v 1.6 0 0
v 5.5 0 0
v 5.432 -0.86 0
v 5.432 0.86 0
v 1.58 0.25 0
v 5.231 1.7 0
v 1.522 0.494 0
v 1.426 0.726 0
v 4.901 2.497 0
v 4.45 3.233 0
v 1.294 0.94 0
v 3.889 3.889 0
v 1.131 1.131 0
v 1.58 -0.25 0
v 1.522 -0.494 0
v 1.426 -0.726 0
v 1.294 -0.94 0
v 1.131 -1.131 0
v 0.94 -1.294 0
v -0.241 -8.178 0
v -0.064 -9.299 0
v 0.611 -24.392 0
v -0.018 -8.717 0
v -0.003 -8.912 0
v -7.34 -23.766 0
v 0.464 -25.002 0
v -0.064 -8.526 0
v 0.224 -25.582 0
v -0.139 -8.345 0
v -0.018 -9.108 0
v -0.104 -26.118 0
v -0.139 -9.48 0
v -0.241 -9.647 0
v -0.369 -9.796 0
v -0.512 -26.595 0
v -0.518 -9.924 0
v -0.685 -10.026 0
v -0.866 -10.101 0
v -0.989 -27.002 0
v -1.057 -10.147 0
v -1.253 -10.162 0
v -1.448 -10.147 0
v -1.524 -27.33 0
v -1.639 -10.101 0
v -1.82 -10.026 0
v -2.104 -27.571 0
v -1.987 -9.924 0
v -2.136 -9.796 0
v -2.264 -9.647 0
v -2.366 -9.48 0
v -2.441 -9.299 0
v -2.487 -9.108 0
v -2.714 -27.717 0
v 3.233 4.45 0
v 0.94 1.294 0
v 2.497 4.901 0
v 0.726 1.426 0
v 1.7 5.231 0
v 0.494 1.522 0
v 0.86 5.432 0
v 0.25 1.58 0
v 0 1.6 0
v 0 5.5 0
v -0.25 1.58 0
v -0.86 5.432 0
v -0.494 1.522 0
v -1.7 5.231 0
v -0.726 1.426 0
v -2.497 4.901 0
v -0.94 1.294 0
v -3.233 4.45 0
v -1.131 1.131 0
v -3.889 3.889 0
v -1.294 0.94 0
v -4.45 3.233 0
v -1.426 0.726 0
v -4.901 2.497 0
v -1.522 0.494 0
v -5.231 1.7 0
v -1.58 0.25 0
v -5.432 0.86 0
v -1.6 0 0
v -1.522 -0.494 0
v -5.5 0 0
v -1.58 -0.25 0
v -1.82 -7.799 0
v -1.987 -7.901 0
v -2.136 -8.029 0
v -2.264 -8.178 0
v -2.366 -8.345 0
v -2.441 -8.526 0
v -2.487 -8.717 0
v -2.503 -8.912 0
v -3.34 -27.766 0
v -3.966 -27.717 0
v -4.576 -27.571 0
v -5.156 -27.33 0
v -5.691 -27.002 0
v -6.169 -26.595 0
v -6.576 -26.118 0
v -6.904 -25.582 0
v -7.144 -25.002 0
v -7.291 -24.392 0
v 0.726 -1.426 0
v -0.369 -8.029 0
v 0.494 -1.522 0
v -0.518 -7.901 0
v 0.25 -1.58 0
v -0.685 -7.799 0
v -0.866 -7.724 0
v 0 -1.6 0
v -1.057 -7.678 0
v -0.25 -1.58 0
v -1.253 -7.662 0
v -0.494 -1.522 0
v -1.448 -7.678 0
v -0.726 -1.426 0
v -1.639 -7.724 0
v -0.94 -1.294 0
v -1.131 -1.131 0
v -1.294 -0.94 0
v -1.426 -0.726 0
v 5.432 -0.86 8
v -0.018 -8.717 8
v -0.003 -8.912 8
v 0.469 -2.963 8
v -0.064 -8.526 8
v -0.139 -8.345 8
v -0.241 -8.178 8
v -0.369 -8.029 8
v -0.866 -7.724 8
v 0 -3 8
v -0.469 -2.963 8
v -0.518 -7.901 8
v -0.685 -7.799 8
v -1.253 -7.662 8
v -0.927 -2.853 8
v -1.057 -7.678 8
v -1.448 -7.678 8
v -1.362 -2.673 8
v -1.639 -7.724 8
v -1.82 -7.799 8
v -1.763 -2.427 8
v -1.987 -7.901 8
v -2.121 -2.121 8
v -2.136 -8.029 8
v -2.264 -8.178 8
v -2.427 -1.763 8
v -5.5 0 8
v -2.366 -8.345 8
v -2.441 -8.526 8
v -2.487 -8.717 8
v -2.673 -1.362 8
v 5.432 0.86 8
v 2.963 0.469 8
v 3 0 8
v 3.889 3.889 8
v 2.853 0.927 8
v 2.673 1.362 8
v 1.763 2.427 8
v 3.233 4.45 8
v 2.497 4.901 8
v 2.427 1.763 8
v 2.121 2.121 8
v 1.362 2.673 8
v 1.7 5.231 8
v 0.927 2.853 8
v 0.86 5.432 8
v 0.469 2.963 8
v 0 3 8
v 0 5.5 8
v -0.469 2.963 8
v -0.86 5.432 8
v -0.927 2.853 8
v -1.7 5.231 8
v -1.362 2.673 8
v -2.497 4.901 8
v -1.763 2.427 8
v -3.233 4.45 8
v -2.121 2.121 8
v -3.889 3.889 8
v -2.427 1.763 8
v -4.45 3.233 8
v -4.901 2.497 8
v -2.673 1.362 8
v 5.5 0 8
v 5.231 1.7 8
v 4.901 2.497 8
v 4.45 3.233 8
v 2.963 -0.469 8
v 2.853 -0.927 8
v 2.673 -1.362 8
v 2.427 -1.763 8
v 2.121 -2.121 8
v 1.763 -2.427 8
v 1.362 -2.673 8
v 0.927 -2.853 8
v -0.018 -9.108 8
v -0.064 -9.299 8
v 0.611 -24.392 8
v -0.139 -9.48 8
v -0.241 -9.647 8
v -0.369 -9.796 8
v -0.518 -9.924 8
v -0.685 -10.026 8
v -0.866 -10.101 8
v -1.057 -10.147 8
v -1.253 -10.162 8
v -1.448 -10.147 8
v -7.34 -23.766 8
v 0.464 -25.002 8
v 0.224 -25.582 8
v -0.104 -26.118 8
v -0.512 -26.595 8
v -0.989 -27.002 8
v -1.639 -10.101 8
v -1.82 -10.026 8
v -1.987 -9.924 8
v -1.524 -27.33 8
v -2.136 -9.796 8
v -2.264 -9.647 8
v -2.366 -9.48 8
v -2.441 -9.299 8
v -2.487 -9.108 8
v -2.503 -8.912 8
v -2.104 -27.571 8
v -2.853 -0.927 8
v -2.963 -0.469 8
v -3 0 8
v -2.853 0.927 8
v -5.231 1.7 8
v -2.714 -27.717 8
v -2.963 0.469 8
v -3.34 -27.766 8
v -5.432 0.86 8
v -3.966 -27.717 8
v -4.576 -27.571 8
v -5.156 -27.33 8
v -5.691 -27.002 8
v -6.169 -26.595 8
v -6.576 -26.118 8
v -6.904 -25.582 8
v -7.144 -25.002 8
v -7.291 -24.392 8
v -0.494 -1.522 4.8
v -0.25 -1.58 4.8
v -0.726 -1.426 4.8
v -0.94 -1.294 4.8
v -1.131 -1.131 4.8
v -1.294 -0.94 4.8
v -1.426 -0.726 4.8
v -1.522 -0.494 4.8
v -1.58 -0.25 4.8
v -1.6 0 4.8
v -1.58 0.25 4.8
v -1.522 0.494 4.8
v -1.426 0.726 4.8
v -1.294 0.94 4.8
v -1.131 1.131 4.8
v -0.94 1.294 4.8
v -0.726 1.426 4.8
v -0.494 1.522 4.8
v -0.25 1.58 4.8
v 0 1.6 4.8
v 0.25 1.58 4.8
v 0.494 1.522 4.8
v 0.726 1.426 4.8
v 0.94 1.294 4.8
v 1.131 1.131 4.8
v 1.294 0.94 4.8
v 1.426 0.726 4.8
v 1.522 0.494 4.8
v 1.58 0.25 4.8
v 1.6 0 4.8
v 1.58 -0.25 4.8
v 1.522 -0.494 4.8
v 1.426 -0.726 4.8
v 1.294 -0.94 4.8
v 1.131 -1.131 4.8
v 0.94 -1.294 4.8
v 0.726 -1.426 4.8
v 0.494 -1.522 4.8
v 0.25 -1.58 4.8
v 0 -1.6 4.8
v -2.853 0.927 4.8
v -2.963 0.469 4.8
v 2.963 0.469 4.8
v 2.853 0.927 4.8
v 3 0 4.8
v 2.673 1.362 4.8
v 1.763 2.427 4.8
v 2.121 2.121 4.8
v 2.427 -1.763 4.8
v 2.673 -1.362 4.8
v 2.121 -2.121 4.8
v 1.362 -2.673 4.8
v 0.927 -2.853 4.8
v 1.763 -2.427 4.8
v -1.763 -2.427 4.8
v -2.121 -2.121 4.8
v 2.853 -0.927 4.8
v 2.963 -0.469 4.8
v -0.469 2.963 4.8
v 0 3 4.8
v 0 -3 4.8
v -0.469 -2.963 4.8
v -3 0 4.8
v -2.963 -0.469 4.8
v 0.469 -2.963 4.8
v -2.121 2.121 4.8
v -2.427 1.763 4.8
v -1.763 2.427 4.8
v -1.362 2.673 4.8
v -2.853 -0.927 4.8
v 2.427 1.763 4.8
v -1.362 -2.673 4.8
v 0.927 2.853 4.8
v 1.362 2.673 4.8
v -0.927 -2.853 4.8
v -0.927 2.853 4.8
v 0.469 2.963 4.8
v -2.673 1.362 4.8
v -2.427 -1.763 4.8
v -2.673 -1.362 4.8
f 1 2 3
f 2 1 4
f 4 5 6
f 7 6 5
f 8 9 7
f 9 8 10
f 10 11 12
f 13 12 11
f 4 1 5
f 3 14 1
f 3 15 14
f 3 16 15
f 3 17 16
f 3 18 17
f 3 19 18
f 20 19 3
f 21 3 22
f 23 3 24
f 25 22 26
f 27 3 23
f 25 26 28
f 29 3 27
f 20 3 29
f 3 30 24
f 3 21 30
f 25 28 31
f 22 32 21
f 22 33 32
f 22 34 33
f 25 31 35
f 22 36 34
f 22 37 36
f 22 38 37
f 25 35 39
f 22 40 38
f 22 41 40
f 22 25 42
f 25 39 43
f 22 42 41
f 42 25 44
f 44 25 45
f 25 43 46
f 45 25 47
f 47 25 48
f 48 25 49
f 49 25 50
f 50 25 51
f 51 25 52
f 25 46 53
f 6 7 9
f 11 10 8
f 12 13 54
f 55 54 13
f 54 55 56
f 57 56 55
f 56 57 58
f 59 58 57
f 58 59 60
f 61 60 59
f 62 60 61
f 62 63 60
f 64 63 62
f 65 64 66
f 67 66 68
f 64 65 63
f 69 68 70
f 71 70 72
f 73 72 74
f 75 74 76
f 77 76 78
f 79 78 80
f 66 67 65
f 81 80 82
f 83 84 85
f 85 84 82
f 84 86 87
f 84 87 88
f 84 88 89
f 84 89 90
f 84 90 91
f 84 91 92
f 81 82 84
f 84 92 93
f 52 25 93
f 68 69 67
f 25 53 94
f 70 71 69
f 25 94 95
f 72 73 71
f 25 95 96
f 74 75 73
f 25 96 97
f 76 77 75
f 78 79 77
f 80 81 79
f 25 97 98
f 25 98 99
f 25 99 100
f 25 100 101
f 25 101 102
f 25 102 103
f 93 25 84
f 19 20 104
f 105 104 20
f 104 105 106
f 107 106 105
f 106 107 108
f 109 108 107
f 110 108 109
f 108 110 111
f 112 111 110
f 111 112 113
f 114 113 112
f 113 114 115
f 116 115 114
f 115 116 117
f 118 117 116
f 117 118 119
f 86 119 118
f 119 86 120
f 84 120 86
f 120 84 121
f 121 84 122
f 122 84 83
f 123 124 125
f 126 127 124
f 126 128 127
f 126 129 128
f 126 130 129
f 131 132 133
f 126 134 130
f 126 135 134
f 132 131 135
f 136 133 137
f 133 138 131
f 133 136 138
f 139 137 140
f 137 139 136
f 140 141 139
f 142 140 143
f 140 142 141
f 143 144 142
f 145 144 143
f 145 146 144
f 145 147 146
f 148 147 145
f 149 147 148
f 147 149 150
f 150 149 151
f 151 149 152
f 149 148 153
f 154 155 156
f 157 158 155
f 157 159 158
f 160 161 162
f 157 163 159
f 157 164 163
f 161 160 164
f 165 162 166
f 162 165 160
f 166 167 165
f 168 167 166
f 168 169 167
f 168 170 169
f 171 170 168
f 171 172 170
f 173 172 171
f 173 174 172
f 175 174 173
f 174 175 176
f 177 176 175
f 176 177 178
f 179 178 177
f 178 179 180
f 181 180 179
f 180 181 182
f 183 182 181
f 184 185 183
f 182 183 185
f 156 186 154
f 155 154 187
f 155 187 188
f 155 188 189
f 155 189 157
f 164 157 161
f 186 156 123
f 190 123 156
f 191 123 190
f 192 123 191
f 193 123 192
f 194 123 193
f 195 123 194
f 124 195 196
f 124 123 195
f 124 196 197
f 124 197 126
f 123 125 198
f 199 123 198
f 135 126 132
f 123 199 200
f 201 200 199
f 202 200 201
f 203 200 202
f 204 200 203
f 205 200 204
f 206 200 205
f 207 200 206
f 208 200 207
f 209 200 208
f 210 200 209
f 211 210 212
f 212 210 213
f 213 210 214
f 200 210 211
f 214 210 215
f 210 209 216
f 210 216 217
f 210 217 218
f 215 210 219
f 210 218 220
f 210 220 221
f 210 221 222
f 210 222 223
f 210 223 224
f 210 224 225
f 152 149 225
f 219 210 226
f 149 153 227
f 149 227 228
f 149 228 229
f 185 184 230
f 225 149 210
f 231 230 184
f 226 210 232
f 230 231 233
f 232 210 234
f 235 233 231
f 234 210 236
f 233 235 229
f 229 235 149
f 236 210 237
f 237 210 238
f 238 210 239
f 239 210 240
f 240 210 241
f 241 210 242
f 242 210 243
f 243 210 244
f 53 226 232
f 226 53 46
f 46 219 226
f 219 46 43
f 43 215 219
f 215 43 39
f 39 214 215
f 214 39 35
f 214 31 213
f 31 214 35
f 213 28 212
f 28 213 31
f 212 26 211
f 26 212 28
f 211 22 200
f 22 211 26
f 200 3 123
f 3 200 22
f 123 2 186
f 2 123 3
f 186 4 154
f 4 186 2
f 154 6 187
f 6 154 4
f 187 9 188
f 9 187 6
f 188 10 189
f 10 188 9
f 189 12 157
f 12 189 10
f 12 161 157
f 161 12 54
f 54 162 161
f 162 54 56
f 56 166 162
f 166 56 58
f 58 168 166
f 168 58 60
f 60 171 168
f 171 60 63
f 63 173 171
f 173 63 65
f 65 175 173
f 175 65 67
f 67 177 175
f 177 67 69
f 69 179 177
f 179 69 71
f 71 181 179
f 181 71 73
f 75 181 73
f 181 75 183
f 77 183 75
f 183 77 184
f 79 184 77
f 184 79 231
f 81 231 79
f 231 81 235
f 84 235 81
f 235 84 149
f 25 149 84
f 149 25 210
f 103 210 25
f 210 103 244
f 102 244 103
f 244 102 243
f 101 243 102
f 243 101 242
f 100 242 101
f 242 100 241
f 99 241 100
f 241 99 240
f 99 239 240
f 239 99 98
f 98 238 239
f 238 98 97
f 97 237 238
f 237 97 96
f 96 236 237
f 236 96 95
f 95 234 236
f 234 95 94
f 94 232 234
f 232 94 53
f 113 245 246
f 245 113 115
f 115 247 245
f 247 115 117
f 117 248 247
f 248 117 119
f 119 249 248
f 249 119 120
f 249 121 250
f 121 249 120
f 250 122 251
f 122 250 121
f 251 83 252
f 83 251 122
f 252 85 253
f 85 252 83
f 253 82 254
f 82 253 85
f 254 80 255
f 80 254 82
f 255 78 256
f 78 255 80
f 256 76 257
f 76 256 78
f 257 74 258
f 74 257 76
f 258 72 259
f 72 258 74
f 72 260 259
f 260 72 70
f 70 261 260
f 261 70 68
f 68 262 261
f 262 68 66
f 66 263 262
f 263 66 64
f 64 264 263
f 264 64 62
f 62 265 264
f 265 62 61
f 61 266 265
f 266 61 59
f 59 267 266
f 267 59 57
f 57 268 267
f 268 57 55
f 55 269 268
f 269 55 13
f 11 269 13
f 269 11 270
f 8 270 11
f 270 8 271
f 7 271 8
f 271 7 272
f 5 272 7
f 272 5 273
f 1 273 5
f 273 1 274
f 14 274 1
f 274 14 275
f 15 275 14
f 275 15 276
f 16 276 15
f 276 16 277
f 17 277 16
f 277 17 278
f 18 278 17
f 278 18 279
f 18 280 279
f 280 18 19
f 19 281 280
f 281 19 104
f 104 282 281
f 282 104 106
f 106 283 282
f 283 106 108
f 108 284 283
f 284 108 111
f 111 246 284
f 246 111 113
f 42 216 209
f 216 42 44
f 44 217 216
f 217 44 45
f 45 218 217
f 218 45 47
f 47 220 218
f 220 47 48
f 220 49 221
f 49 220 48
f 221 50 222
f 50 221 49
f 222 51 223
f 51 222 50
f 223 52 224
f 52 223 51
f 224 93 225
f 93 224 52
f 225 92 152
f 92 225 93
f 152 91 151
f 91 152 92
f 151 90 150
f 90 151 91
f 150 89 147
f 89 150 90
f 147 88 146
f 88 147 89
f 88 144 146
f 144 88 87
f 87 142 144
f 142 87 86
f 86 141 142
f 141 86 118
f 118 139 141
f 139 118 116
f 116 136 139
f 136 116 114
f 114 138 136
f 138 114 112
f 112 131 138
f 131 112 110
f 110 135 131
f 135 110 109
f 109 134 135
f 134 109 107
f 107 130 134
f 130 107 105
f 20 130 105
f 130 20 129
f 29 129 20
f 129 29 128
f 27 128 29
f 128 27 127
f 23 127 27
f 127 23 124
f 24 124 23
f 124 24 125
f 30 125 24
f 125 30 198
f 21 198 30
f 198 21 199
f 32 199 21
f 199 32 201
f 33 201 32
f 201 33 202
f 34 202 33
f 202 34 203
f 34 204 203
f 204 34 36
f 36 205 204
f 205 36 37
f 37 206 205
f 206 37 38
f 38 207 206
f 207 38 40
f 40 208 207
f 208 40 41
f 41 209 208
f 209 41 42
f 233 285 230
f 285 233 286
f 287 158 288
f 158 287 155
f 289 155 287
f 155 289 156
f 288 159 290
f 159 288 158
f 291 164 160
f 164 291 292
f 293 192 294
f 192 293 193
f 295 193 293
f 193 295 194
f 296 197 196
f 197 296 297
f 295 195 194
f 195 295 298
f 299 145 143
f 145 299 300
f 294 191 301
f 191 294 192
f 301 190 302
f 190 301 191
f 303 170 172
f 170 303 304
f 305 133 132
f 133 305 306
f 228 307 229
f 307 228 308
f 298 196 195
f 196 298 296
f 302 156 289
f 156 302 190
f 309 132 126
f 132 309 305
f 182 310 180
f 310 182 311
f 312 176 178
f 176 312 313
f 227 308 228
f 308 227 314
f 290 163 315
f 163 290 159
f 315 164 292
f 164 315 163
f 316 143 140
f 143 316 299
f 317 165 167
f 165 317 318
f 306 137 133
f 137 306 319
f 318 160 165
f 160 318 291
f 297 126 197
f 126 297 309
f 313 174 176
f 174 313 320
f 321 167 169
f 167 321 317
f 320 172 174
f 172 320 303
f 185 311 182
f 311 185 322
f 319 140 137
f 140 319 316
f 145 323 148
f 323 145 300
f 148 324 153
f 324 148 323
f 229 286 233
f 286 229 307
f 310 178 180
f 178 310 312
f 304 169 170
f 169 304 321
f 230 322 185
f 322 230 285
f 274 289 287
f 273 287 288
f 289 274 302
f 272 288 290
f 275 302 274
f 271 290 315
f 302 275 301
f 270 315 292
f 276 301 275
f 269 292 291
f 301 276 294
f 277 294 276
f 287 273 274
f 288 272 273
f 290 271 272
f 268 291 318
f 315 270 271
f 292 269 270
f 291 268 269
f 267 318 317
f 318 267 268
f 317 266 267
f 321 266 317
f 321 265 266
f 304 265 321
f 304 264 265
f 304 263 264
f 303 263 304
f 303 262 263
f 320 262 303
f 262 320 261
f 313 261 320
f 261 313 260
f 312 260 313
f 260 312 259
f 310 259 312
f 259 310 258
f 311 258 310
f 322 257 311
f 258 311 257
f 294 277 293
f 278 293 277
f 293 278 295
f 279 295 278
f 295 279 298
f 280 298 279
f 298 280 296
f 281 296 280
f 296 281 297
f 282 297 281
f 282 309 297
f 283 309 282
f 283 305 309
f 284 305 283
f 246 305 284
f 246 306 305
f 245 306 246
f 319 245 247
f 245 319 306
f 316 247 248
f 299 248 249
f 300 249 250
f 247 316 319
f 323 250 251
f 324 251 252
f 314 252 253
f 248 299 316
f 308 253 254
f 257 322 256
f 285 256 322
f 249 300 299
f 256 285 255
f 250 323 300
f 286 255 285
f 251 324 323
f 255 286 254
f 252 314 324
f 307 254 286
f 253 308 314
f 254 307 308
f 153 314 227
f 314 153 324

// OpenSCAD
include <../lib/spool-drybox-lib.scad>;
$fn = 40;
latch_lever();
